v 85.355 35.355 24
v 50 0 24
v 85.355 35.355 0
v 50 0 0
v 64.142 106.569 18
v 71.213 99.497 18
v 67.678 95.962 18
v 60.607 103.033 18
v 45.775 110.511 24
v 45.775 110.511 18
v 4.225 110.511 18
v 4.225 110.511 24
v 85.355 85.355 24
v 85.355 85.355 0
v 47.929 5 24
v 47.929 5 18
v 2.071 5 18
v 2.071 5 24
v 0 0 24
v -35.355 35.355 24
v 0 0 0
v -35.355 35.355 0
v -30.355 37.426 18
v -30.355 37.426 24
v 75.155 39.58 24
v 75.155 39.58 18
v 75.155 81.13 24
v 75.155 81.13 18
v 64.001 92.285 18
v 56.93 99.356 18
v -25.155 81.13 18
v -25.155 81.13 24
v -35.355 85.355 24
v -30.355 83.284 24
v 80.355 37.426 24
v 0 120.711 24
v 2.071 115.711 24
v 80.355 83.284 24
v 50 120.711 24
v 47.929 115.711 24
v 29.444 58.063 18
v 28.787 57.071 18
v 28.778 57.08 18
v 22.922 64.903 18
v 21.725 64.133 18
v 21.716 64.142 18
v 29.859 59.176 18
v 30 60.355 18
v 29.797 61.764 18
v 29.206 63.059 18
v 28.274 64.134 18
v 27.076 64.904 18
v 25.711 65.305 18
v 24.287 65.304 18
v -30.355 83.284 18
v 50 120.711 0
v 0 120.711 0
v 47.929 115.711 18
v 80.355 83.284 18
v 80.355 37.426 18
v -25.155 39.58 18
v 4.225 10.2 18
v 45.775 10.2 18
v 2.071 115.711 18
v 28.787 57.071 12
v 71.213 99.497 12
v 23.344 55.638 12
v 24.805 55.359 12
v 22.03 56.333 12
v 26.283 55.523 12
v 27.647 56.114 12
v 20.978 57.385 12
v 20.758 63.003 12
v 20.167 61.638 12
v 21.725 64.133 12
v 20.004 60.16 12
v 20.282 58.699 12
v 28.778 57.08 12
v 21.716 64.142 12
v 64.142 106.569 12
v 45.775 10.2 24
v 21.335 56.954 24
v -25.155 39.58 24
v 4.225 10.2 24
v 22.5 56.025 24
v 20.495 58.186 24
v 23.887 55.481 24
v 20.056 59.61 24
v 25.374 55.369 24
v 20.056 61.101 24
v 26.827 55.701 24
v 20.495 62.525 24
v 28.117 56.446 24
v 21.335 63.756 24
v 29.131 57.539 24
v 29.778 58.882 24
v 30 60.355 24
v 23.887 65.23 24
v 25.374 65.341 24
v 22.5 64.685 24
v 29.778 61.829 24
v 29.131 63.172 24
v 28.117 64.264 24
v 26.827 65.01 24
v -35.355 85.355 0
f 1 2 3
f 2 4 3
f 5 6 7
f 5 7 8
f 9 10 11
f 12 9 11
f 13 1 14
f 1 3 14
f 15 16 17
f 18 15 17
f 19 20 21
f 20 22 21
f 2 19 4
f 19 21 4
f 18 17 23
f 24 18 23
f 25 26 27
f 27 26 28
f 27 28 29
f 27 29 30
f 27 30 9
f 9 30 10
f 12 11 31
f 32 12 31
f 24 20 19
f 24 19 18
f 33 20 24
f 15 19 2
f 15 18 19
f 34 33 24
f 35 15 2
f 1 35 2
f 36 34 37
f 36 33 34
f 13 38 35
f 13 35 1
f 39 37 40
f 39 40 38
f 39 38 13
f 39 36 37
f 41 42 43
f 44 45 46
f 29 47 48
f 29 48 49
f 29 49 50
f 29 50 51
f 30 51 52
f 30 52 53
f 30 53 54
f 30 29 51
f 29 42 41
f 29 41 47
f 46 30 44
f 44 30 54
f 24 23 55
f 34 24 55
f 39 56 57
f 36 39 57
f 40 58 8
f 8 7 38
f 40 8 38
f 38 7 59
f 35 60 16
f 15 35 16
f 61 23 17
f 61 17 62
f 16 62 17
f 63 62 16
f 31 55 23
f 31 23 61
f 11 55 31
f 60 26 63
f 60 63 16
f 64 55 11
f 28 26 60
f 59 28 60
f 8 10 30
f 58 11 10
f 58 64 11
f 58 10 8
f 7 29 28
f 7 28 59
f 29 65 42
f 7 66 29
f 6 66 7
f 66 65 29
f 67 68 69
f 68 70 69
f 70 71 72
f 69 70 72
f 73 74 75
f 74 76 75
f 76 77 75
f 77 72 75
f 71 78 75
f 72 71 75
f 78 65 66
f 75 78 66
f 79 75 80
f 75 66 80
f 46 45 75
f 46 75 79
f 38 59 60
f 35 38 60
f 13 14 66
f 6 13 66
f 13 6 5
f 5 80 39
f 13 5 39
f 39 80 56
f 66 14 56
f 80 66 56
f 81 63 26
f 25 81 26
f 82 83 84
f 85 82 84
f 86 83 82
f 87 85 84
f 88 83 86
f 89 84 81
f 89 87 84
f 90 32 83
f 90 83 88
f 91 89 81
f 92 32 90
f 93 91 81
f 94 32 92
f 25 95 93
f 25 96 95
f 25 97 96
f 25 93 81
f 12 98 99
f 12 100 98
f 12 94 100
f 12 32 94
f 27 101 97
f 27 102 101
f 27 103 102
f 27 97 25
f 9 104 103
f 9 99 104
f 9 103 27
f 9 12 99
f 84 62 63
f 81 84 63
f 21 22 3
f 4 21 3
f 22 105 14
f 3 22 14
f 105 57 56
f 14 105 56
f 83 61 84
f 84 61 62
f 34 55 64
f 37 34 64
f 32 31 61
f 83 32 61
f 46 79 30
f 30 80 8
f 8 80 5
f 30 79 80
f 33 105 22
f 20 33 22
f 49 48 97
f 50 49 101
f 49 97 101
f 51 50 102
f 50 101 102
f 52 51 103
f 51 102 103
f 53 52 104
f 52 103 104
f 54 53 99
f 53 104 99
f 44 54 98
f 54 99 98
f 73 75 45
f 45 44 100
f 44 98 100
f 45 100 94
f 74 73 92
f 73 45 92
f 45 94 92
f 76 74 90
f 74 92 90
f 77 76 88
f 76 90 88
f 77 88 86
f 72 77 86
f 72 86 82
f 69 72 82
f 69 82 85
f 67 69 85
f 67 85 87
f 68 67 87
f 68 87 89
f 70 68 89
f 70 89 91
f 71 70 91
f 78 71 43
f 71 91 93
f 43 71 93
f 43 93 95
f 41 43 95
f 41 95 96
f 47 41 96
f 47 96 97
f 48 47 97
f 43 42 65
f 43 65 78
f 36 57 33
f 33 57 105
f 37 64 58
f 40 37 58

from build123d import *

# Parameters (mm, degrees)
F1_DEPTH = 18
F3_DEPTH = 6
F4_R     = 5
F5_DEPTH = 12
F6_W     = 10
F6_H     = 6
F7_DEPTH = 60


with BuildPart() as f1:
    # F0 (on Top) → F1 (new body)
    with BuildSketch(Plane.XY):
        Polygon((-35.3553390593, 35.3553390593), (0, 0), (25, 0), (25, 120.7106781187), (0, 120.7106781187), (-35.3553390593, 85.3553390593), align=None)
        Polygon((25, 120.7106781187), (25, 0), (50, 0), (85.3553390593, 35.3553390593), (85.3553390593, 85.3553390593), (50, 120.7106781187), align=None)
    extrude(amount=F1_DEPTH)

    # F2 (on face) → F3 (join)
    with BuildSketch(Plane.XY.offset(18)):
        Polygon((-35.3553390593, 85.3553390593), (-35.3553390593, 35.3553390593), (0, 0), (50, 0), (85.3553390593, 35.3553390593), (85.3553390593, 85.3553390593), (50, 120.7106781187), (0, 120.7106781187), align=None)
        Polygon((2.0710678119, 5), (-30.3553390593, 37.4264068712), (-30.3553390593, 83.2842712475), (2.0710678119, 115.7106781187), (47.9289321881, 115.7106781187), (80.3553390593, 83.2842712475), (80.3553390593, 37.4264068712), (47.9289321881, 5), align=None, mode=Mode.SUBTRACT)
        Polygon((-25.1553390593, 81.1303607231), (-25.1553390593, 39.5803173955), (4.2249783362, 10.2), (45.7750216638, 10.2), (75.1553390593, 39.5803173955), (75.1553390593, 81.1303607231), (45.7750216638, 110.5106781187), (4.2249783362, 110.5106781187), align=None)
    extrude(amount=F3_DEPTH)

    # F4 (on face) → F5 (cut)
    with BuildSketch(Plane.XY.offset(24)):
        with Locations((25, 60.3553390593)):
            Circle(F4_R)
    extrude(amount=-F5_DEPTH, mode=Mode.SUBTRACT)

    # F6 (on face) → F7 (cut)
    with BuildSketch(Plane(origin=(85.3553390593, 85.3553390593, 0), x_dir=(-0.7071067812, 0.7071067812, 0), z_dir=(0.7071067812, 0.7071067812, 0))):
        with Locations((25, 15)):
            Rectangle(F6_W, F6_H)
    extrude(amount=-F7_DEPTH, mode=Mode.SUBTRACT)


solid = f1.part
